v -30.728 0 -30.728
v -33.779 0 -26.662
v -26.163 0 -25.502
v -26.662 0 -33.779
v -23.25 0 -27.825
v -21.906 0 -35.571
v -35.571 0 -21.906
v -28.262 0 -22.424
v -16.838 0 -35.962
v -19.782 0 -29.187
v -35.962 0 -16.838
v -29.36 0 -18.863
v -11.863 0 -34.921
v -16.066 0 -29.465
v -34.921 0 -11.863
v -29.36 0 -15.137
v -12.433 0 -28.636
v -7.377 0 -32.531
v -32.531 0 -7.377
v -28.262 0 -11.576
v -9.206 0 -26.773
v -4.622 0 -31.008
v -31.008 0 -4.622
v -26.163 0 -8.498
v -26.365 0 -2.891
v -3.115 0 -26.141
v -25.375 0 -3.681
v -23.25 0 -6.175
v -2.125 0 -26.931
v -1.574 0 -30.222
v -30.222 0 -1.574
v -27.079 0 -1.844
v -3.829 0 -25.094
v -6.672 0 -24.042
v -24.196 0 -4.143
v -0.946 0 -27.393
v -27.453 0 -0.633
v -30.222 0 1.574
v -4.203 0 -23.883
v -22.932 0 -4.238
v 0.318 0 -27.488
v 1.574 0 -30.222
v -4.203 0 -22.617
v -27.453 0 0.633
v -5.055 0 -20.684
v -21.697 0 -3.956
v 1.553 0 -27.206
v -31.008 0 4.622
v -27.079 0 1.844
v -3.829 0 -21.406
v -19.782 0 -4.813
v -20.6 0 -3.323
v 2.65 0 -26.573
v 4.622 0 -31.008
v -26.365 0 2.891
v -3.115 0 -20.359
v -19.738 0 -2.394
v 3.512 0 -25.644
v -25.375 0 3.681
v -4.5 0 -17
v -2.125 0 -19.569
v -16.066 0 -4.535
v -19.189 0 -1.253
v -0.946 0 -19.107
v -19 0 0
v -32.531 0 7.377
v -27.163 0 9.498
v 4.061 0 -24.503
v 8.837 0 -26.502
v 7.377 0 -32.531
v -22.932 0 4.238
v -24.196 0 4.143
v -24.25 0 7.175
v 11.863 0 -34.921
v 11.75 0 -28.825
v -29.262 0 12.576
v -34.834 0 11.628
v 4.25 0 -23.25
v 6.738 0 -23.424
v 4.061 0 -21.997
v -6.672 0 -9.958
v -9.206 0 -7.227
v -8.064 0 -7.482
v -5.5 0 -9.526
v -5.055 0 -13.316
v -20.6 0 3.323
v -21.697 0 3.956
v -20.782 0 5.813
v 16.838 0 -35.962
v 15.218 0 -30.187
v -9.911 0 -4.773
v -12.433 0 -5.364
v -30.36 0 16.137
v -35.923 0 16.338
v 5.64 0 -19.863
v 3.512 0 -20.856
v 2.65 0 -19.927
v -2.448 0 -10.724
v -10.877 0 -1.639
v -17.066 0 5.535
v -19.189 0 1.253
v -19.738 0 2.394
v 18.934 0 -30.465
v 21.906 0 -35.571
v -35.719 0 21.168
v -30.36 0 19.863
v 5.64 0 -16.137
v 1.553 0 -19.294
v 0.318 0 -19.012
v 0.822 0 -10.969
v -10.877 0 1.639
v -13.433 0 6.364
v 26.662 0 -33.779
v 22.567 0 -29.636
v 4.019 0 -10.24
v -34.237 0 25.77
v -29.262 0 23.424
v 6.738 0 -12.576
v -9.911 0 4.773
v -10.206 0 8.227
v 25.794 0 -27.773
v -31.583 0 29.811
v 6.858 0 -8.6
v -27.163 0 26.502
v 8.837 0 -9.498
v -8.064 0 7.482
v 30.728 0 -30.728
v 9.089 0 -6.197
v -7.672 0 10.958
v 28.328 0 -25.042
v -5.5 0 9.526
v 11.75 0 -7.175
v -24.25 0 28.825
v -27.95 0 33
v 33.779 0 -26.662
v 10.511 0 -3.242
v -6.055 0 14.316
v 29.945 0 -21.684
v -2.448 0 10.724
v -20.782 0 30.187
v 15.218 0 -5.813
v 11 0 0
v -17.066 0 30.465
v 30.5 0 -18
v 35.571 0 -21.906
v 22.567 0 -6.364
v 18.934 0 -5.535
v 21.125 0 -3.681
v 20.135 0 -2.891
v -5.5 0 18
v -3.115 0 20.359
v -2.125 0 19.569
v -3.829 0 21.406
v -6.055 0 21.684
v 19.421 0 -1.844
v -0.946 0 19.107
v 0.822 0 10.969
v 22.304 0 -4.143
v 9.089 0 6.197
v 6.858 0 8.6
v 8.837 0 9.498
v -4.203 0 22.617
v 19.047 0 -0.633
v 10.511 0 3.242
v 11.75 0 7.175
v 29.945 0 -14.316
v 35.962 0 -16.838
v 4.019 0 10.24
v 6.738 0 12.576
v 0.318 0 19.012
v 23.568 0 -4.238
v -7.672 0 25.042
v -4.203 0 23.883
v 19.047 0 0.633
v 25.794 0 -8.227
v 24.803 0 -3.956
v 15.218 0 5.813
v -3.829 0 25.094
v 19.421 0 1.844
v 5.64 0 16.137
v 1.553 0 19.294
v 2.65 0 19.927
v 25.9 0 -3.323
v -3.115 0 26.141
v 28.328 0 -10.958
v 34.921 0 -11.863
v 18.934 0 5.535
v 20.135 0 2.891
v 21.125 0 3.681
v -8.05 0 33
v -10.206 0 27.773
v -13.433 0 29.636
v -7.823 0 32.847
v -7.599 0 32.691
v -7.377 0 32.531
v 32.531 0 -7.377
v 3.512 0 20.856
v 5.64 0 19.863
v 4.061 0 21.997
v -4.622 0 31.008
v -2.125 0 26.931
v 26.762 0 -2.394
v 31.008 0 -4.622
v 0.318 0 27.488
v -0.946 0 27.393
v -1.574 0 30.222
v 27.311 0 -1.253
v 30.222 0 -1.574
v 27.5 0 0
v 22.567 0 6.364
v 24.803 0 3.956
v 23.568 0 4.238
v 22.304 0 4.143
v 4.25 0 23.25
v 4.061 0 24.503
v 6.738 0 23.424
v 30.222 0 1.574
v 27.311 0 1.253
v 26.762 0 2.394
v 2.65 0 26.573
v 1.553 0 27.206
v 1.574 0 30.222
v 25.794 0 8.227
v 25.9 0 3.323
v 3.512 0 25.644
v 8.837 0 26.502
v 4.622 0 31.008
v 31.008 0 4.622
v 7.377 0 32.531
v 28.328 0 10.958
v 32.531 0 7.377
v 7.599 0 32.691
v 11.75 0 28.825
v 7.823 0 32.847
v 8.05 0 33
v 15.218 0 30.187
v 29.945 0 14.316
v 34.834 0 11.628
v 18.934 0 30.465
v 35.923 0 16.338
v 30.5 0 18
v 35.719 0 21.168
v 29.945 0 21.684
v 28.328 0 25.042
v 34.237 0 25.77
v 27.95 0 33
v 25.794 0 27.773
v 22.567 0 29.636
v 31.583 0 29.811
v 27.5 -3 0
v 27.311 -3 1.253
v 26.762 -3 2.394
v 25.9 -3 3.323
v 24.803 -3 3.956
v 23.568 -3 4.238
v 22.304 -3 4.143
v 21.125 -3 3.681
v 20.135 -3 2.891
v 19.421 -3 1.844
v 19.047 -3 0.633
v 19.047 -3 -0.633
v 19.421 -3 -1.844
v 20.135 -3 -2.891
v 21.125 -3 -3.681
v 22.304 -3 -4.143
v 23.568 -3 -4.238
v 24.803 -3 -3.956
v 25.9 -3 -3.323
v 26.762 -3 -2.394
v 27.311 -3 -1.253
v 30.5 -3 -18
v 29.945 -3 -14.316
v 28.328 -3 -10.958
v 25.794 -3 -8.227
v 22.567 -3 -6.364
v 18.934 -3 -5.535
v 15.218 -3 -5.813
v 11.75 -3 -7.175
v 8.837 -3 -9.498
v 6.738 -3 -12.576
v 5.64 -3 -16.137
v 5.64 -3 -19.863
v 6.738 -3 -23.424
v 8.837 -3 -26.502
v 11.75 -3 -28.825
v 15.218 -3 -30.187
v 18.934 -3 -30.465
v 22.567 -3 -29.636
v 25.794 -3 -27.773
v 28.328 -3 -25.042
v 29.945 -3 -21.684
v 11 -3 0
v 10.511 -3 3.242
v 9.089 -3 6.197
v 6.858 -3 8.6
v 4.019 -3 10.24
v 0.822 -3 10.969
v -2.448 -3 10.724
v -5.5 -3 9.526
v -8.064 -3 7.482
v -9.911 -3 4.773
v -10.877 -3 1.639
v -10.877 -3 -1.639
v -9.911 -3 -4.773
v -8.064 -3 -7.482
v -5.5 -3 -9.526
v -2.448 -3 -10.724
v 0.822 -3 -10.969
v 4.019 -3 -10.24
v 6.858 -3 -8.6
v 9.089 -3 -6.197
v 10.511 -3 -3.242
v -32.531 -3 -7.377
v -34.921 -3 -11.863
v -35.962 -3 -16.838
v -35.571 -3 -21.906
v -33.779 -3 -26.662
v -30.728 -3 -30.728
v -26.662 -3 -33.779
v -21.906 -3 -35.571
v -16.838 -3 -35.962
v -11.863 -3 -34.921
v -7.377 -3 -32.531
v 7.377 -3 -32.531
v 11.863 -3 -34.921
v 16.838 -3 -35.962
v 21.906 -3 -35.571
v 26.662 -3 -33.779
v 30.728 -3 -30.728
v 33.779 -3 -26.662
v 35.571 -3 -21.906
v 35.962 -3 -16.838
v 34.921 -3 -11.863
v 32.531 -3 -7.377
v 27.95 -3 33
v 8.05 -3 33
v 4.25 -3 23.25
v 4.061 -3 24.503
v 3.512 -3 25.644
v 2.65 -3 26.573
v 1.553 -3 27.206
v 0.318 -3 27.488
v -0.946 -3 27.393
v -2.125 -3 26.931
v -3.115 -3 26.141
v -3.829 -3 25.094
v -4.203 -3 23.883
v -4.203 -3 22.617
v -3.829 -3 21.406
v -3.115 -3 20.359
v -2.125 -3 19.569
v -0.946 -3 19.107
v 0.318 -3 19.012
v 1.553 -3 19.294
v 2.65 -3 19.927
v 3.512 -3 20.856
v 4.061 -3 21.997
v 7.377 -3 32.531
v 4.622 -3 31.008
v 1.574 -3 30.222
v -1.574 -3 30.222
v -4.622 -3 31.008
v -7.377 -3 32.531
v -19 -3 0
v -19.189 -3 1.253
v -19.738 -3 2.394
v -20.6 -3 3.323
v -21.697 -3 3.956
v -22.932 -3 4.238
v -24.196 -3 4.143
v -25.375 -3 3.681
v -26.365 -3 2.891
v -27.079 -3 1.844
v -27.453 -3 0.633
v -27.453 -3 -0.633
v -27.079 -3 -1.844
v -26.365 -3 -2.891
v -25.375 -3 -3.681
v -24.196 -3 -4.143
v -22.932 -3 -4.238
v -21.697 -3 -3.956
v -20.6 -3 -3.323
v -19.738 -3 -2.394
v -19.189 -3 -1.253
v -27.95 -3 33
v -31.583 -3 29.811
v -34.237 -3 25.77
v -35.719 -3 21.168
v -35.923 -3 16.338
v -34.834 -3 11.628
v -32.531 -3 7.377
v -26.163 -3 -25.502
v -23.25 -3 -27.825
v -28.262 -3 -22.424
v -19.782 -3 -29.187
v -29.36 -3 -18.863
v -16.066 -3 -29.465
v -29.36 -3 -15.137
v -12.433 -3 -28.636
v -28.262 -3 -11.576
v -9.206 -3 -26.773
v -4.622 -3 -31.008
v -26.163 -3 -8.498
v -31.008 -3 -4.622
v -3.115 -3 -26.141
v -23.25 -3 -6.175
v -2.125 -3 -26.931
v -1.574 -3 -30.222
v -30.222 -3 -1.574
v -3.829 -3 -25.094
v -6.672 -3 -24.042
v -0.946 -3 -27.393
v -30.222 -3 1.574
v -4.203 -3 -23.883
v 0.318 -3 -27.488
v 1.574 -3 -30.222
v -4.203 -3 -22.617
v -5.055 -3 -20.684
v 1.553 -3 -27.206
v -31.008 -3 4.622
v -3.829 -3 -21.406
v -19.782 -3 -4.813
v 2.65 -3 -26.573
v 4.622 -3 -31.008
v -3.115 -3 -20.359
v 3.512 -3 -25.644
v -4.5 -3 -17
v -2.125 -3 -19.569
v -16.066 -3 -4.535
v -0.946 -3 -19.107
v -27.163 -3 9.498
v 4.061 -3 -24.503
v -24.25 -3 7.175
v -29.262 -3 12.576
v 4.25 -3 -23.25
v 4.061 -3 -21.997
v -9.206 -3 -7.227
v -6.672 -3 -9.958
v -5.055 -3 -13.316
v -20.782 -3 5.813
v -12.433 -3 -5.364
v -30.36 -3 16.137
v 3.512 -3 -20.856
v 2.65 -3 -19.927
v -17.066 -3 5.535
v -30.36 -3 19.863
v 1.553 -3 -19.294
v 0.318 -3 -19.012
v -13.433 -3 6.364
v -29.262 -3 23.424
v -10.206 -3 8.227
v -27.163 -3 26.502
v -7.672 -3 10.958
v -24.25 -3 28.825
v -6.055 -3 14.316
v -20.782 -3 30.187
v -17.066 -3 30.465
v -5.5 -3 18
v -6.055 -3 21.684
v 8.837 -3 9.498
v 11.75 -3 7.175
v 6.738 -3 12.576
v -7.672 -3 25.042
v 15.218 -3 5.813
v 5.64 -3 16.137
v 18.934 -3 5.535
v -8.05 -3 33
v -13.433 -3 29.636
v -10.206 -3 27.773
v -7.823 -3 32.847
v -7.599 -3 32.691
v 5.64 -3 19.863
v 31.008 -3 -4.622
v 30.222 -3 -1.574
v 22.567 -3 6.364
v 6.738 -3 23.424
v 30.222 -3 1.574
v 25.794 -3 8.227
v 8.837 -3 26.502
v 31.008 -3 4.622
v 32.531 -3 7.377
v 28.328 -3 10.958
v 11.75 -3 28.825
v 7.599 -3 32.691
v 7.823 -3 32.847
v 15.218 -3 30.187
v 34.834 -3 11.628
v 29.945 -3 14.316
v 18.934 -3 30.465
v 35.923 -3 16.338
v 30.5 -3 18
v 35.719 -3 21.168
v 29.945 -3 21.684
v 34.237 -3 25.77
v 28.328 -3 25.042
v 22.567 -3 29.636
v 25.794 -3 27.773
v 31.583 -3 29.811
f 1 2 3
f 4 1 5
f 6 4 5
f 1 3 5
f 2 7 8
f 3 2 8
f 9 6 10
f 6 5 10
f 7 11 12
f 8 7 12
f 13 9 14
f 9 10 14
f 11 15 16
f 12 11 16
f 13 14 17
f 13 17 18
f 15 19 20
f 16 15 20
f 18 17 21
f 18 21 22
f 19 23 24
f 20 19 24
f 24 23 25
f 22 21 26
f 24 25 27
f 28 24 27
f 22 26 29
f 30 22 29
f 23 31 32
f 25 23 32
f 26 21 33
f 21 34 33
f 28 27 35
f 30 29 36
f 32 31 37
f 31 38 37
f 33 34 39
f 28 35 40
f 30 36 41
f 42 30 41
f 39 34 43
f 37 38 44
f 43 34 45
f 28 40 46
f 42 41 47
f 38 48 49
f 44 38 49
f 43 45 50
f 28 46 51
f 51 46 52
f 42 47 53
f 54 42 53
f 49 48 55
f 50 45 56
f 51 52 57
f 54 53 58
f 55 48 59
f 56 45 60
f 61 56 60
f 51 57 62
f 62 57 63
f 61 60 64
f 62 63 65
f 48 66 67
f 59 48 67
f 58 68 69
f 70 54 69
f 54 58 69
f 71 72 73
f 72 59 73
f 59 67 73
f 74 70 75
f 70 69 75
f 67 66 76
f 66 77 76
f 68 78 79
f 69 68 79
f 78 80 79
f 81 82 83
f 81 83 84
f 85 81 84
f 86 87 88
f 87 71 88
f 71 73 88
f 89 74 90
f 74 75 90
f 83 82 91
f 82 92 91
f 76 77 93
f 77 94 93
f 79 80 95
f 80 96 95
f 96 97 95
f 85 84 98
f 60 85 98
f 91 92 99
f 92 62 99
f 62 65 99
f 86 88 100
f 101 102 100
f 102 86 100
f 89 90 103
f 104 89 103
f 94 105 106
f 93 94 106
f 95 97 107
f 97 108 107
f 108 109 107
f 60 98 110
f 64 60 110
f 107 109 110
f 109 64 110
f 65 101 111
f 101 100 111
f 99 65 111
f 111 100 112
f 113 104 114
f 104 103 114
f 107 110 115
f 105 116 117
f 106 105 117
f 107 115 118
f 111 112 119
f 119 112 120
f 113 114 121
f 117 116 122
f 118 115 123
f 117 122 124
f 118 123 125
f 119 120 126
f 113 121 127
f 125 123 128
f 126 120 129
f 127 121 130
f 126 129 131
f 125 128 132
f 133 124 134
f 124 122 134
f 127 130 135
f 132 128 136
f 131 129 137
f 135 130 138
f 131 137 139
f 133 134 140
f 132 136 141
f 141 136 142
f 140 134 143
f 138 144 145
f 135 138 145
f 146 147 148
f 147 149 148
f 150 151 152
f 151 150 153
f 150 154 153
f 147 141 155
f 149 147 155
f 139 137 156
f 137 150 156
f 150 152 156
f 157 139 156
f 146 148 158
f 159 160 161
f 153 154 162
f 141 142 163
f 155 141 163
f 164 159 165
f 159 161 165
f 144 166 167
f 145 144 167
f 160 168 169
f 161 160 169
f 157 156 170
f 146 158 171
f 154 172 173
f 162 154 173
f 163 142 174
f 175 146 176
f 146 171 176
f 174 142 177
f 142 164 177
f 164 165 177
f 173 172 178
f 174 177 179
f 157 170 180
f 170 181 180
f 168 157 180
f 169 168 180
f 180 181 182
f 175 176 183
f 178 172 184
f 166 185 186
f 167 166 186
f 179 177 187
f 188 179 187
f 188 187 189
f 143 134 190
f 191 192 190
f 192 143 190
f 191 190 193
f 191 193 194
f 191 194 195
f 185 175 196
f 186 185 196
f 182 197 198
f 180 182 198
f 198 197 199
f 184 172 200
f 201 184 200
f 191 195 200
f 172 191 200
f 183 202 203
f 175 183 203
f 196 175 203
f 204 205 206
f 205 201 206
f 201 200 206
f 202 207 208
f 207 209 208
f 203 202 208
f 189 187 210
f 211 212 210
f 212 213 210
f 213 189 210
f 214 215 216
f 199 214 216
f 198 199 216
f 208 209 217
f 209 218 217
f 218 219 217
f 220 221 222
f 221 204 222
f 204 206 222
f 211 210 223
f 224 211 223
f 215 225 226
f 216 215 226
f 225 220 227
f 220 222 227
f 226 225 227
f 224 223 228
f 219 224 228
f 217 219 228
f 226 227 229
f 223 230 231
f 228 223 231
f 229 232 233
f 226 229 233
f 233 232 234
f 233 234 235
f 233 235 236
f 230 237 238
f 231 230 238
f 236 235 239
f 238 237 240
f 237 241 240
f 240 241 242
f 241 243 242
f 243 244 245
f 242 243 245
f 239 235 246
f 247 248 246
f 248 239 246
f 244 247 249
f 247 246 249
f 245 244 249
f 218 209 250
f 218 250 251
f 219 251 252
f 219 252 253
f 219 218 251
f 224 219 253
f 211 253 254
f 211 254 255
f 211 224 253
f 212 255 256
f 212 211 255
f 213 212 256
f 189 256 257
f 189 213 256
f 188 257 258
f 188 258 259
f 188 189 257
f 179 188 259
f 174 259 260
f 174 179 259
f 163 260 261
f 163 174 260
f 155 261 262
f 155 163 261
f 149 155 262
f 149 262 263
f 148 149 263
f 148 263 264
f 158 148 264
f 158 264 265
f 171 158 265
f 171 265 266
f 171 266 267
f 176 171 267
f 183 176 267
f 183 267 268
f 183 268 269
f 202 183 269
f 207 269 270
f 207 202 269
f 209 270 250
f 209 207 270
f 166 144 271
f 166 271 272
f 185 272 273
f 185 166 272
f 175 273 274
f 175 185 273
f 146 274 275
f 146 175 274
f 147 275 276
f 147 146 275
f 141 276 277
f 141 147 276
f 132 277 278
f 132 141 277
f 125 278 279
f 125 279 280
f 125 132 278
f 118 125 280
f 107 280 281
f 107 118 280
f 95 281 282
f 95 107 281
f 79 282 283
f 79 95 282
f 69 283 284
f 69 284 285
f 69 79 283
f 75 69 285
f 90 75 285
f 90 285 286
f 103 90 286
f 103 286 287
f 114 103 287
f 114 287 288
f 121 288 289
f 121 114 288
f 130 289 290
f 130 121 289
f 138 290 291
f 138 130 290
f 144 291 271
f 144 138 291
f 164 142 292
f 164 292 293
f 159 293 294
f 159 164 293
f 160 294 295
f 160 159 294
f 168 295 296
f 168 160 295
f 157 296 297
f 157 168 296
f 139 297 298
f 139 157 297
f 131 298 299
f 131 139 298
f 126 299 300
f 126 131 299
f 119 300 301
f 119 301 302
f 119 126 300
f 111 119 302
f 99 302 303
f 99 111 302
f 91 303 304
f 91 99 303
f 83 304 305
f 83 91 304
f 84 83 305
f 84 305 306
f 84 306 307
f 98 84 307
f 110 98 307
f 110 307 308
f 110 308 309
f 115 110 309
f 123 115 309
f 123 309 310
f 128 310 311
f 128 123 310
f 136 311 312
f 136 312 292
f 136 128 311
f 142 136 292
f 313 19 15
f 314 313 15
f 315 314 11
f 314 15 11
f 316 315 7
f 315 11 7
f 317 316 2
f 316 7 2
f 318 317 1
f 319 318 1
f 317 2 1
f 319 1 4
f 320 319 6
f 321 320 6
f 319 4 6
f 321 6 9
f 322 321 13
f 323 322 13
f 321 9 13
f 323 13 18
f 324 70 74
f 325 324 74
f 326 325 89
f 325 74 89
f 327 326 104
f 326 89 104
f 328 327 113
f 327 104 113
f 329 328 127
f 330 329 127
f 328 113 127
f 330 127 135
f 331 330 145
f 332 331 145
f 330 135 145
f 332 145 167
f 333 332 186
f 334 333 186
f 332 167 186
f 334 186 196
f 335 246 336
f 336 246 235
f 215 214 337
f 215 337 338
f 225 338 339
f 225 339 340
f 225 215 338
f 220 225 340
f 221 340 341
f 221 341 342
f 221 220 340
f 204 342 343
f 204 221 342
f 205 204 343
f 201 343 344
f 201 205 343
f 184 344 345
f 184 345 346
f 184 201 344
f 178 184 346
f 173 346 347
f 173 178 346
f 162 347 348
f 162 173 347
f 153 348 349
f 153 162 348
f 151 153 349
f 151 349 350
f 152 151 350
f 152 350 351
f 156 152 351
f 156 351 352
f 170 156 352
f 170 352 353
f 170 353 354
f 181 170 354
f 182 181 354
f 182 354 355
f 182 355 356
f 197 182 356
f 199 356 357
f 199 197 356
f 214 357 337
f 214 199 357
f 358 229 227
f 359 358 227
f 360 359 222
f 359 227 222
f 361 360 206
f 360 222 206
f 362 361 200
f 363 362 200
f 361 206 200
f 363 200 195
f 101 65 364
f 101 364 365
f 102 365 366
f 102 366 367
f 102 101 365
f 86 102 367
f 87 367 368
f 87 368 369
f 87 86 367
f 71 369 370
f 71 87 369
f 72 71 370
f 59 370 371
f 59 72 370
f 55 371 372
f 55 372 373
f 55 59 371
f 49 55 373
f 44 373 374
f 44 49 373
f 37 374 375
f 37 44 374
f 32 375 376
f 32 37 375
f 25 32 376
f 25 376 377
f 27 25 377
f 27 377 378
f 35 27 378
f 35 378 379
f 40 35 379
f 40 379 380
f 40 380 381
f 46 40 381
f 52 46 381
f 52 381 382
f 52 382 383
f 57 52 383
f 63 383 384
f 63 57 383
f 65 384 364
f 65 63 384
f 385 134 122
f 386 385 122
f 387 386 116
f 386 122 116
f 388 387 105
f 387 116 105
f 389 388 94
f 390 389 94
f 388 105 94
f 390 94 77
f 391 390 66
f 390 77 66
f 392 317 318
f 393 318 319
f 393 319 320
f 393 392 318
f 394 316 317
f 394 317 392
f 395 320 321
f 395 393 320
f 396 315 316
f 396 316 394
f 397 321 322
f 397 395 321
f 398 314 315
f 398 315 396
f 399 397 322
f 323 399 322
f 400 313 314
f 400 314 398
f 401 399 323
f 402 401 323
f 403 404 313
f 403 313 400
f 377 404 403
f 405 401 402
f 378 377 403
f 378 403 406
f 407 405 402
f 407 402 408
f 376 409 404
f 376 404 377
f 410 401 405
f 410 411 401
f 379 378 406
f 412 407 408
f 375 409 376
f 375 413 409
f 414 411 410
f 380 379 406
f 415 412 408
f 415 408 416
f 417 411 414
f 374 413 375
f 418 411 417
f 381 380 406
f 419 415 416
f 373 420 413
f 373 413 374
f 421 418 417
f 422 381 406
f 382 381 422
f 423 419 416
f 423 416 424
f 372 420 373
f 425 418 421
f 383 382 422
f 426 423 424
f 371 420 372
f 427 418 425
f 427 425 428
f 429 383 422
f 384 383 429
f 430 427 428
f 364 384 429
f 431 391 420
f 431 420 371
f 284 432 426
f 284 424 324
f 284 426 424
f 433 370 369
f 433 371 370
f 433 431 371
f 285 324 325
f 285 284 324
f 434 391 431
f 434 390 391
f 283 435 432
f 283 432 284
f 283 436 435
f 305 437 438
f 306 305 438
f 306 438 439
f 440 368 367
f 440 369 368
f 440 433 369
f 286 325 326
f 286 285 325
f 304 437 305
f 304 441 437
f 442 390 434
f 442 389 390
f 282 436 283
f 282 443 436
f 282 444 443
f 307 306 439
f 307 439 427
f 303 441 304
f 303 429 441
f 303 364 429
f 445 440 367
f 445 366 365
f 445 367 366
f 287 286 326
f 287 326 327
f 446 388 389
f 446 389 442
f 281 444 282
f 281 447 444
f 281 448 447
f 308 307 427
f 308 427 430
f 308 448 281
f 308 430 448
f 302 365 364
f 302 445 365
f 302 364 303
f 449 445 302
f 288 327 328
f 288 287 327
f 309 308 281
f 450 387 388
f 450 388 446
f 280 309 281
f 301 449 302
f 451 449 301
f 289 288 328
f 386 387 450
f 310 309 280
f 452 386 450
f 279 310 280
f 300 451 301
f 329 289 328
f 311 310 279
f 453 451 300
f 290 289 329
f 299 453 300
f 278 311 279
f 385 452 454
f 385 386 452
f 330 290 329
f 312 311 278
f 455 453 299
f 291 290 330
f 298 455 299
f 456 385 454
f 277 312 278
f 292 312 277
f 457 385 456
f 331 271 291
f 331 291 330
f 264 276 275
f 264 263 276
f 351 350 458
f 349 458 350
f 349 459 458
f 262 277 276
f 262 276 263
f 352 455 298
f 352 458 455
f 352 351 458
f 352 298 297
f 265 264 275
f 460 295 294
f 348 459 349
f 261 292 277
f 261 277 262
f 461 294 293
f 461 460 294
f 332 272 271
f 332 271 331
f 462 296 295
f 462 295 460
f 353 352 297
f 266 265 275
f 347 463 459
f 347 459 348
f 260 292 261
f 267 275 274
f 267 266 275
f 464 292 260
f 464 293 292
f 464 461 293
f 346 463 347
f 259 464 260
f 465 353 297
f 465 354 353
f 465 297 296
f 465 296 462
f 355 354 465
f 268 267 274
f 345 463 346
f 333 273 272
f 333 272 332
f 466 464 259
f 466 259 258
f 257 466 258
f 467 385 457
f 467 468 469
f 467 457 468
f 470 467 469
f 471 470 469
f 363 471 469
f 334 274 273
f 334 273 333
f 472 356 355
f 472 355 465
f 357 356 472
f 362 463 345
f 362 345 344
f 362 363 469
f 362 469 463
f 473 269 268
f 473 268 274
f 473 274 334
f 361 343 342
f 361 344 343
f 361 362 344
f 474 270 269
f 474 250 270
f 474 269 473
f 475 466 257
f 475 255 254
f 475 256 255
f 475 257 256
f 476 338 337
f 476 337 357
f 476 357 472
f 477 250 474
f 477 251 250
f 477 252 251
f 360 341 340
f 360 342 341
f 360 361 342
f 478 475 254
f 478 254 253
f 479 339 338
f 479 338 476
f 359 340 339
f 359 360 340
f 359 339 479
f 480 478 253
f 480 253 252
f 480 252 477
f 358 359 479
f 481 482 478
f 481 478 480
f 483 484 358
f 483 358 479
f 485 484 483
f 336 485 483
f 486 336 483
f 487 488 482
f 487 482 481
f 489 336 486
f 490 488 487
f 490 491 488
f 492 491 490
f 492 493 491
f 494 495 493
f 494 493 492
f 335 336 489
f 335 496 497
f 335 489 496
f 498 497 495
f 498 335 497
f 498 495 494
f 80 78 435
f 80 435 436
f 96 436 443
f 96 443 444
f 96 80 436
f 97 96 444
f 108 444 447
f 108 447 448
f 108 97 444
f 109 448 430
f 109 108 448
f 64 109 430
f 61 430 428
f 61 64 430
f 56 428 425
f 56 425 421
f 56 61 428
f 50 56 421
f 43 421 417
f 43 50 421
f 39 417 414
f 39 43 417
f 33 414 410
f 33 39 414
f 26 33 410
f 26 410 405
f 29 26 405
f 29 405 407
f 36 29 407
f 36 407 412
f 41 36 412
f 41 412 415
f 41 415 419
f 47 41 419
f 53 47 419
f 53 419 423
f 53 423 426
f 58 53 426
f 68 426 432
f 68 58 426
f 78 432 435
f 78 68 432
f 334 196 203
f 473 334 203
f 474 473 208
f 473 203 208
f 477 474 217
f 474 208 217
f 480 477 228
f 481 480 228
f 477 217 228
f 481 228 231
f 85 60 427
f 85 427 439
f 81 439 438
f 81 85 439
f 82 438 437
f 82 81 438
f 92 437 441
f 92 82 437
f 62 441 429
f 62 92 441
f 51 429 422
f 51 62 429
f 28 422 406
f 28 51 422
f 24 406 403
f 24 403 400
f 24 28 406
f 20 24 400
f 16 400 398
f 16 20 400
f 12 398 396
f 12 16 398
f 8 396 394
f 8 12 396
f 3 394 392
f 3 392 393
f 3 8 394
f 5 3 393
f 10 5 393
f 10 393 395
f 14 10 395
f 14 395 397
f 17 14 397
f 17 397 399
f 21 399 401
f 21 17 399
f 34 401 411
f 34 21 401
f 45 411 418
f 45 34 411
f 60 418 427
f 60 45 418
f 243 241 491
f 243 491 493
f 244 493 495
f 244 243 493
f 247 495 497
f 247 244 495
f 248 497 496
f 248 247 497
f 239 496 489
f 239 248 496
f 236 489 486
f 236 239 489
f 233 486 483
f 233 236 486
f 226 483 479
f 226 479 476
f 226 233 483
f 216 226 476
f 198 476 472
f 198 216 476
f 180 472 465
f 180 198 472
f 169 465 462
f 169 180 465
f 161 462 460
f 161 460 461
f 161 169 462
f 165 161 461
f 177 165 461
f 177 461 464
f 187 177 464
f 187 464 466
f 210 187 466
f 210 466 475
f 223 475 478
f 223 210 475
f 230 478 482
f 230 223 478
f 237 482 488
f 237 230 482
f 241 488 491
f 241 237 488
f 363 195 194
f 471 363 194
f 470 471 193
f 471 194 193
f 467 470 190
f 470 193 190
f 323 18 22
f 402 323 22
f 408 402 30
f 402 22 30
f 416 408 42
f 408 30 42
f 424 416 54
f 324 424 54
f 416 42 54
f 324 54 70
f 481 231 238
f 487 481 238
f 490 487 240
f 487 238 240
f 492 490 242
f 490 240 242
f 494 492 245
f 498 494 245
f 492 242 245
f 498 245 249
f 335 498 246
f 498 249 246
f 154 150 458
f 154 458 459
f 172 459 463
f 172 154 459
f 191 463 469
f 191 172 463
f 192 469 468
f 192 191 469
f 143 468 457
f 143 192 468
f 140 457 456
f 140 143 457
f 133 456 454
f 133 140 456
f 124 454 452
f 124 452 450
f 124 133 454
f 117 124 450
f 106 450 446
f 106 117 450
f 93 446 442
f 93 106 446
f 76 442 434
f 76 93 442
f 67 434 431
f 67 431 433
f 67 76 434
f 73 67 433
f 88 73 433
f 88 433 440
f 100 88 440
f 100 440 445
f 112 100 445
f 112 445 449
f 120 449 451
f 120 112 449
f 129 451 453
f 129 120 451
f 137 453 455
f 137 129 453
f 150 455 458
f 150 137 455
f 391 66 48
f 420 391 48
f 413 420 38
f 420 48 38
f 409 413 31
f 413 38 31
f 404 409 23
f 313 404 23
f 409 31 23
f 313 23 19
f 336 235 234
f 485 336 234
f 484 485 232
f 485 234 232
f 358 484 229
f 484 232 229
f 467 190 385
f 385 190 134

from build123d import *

# Parameters (mm, degrees)
F0_R     = 12.5
F0_R_2   = 4.25
F0_R_3   = 11
F1_DEPTH = 3


with BuildPart() as f1:
    # F0 (on Front) → F1 (new body)
    with BuildSketch(Plane.XZ):
        with BuildLine():
            ThreePointArc((32.531102, -7.377049), (30.122145, 0), (32.531102, 7.377049))
            ThreePointArc((32.531102, 7.377049), (35.719014, 21.168052), (27.949874, 33))
            Line((27.949874, 33), (8.050126, 33))
            ThreePointArc((8.050126, 33), (7.710916, 32.769386), (7.377049, 32.531102))
            ThreePointArc((7.377049, 32.531102), (0, 30.122145), (-7.377049, 32.531102))
            ThreePointArc((-7.377049, 32.531102), (-7.710916, 32.769386), (-8.050126, 33))
            Line((-8.050126, 33), (-27.949874, 33))
            ThreePointArc((-27.949874, 33), (-35.719014, 21.168052), (-32.531102, 7.377049))
            ThreePointArc((-32.531102, 7.377049), (-30.122145, 0), (-32.531102, -7.377049))
            ThreePointArc((-32.531102, -7.377049), (-30.727922, -30.727922), (-7.377049, -32.531102))
            ThreePointArc((-7.377049, -32.531102), (0, -30.122145), (7.377049, -32.531102))
            ThreePointArc((7.377049, -32.531102), (30.727922, -30.727922), (32.531102, -7.377049))
        make_face()
        with Locations((-17, -17)):
            Circle(F0_R, mode=Mode.SUBTRACT)
        with Locations((0, -23.25)):
            Circle(F0_R_2, mode=Mode.SUBTRACT)
        with Locations((18, -18)):
            Circle(F0_R, mode=Mode.SUBTRACT)
        with Locations((-23.25, 0)):
            Circle(F0_R_2, mode=Mode.SUBTRACT)
        with Locations((-18, 18)):
            Circle(F0_R, mode=Mode.SUBTRACT)
        Circle(F0_R_3, mode=Mode.SUBTRACT)
        with Locations((23.25, 0)):
            Circle(F0_R_2, mode=Mode.SUBTRACT)
        with Locations((0, 23.25)):
            Circle(F0_R_2, mode=Mode.SUBTRACT)
        with Locations((18, 18)):
            Circle(F0_R, mode=Mode.SUBTRACT)
    extrude(amount=F1_DEPTH)


solid = f1.part
